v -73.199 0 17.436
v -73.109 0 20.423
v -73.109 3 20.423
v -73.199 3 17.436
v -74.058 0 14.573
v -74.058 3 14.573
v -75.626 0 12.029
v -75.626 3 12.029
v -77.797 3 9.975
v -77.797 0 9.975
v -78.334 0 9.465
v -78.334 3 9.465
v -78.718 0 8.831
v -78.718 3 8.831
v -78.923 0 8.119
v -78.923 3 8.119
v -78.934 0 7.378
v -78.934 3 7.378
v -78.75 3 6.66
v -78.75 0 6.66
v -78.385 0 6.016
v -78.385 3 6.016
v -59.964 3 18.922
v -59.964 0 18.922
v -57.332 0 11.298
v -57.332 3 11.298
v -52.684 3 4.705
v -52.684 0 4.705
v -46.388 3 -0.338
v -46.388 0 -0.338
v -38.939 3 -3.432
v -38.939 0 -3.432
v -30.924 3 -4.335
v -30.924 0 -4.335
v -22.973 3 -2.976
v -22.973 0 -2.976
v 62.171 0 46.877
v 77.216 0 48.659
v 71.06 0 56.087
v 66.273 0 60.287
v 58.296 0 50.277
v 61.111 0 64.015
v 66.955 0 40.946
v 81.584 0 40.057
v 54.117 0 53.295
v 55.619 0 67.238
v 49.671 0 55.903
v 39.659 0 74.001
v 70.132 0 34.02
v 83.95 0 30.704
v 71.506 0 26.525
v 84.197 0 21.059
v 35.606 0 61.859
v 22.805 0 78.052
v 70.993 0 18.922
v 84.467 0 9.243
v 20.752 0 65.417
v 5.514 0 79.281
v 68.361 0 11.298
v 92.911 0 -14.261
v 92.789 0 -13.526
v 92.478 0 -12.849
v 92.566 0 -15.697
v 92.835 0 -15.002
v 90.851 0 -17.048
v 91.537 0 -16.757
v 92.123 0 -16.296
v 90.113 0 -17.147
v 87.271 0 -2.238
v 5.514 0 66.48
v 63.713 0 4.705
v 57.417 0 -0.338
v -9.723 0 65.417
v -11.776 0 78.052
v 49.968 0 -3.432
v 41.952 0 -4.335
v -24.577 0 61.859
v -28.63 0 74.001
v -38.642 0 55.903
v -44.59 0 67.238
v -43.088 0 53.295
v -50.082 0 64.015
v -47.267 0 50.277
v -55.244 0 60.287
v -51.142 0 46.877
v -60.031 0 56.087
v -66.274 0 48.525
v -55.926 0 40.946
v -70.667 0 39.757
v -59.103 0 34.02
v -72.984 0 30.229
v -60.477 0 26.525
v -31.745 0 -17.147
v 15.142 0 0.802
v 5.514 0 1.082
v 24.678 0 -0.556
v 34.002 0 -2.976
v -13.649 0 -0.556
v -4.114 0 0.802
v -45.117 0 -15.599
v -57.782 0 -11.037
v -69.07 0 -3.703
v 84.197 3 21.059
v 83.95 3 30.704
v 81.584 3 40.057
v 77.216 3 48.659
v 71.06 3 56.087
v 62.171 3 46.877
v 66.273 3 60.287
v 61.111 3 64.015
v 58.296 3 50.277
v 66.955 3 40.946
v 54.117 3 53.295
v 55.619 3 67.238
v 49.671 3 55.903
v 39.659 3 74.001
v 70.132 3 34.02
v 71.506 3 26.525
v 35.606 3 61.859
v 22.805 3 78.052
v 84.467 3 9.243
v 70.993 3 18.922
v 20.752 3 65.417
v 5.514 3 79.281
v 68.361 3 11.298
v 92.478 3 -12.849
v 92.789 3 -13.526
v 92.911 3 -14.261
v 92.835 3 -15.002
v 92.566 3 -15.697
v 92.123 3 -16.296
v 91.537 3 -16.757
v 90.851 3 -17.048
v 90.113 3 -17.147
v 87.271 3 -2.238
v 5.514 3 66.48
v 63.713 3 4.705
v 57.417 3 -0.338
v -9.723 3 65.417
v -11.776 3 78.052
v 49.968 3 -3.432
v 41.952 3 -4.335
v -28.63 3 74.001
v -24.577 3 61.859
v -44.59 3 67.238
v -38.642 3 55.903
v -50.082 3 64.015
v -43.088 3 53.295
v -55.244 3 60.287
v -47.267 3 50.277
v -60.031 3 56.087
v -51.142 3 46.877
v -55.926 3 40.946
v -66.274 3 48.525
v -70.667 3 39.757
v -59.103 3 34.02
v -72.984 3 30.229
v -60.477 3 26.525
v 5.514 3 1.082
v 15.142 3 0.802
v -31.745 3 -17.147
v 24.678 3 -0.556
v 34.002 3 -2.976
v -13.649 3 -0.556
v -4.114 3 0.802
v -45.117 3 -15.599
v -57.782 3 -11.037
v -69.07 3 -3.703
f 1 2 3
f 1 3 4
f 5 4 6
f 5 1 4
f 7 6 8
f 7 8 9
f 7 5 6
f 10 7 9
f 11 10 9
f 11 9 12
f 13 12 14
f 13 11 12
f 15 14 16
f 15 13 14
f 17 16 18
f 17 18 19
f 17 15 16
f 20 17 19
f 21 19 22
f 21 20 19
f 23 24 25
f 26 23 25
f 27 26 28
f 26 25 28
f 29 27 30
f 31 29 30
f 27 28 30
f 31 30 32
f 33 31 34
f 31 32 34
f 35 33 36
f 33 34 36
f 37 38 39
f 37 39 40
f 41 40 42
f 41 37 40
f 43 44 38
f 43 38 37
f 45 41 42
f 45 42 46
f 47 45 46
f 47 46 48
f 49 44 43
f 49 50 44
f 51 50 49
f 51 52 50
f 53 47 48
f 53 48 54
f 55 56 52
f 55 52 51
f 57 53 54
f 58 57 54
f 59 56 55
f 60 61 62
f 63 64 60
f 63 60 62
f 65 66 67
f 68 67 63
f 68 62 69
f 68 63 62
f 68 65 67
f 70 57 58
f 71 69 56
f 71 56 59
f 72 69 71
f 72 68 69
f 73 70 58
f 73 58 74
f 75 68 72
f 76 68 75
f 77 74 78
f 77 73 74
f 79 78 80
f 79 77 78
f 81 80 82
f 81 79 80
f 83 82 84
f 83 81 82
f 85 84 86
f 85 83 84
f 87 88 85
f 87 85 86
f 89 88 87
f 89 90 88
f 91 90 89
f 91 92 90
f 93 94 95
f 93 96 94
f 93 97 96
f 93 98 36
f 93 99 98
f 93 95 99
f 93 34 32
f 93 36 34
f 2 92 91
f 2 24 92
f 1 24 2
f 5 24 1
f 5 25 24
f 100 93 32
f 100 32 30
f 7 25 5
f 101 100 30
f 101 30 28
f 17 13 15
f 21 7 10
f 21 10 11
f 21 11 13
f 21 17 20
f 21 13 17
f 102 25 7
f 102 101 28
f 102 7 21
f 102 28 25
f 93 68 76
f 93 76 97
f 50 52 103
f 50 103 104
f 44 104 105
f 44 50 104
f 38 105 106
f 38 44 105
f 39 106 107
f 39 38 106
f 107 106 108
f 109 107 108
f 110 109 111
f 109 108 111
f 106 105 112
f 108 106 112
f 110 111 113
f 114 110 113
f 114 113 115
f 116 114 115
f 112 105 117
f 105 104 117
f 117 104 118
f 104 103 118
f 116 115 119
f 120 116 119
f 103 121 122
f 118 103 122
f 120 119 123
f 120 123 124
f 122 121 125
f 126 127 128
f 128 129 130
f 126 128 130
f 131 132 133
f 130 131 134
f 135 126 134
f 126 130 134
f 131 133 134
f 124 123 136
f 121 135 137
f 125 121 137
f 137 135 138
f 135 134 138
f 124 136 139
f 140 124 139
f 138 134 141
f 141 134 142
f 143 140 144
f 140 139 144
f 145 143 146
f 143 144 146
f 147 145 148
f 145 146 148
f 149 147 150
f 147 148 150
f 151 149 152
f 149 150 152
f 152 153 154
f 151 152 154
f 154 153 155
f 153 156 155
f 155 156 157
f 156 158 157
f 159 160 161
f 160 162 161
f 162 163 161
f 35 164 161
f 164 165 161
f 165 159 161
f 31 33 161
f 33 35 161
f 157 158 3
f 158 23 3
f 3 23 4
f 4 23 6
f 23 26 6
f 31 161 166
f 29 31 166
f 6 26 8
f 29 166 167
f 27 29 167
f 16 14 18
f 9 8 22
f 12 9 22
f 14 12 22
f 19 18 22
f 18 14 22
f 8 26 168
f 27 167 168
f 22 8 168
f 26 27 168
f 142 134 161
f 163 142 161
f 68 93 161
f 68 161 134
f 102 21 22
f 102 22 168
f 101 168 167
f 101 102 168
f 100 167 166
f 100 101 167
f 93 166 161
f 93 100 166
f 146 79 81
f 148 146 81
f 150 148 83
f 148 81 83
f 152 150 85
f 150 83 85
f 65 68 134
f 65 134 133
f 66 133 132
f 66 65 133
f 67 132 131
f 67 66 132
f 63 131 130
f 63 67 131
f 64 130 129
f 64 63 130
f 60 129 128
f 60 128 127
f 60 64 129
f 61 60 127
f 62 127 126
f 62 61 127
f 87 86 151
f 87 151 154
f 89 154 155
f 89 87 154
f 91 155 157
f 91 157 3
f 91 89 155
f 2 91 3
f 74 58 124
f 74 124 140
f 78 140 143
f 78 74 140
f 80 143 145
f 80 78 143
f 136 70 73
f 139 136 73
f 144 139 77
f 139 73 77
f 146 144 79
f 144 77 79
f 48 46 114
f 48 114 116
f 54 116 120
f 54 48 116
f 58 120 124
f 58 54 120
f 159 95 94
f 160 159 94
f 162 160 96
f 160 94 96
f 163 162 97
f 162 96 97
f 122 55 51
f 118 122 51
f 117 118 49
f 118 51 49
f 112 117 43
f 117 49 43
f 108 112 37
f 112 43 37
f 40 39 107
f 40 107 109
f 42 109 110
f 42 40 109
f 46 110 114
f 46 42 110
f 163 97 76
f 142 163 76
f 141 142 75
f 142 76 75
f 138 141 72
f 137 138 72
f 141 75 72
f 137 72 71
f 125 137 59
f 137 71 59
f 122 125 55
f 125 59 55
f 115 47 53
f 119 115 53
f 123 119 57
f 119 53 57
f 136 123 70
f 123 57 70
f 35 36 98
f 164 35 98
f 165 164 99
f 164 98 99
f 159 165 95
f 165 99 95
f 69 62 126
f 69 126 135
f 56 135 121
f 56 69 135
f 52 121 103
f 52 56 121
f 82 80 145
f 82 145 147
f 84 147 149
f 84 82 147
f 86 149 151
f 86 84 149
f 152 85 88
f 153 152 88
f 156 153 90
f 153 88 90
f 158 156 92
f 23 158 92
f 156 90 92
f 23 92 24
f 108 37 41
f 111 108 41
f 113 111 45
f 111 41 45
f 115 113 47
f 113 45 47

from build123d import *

# Parameters (mm, degrees)
BOSS_EXTRUDE1_DEPTH = 3


with BuildPart() as part:
    # Sketch1 → Boss-Extrude1 (new body)
    with BuildSketch(Plane(origin=(0, 0, 0), x_dir=(1, 0, 0), z_dir=(0, 1, 0))):
        with BuildLine():
            Line((-31.744728966, 17.146847669), (90.112594835, 17.146847669))
            ThreePointArc((90.112594835, 17.146847669), (92.565620931, 15.696908028), (92.478118614, 12.848749793))
            ThreePointArc((92.478118614, 12.848749793), (85.55789243, -3.426446533), (84.197045341, -21.059360105))
            ThreePointArc((84.197045341, -21.059360105), (81.584356476, -40.056839396), (71.059546267, -56.086771791))
            ThreePointArc((71.059546267, -56.086771791), (63.736401413, -62.212035121), (55.619101507, -67.237643905))
            ThreePointArc((55.619101507, -67.237643905), (31.315398674, -76.373966348), (5.514443068, -79.281379121))
            ThreePointArc((5.514443068, -79.281379121), (-20.286512537, -76.373966348), (-44.59021537, -67.237643905))
            ThreePointArc((-44.59021537, -67.237643905), (-52.707515276, -62.212035121), (-60.03066013, -56.086771791))
            ThreePointArc((-60.03066013, -56.086771791), (-70.666595812, -39.757213537), (-73.108914698, -20.422977605))
            ThreePointArc((-73.108914698, -20.422977605), (-74.05774513, -14.573171652), (-77.796738294, -9.975298341))
            ThreePointArc((-77.796738294, -9.975298341), (-78.92336426, -8.119267018), (-78.384627262, -6.015959912))
            ThreePointArc((-78.384627262, -6.015959912), (-57.78218164, 11.037323217), (-31.744728966, 17.146847669))
        make_face()
        with BuildLine():
            ThreePointArc((5.514443068, -1.081998552), (19.929462064, -0.256796987), (34.001578397, 2.975736417))
            ThreePointArc((34.001578397, 2.975736417), (57.41708067, 0.337527336), (70.993213533, -18.922132846))
            ThreePointArc((70.993213533, -18.922132846), (70.131692962, -34.019755233), (62.170548913, -46.876683515))
            ThreePointArc((62.170548913, -46.876683515), (56.242369759, -51.835162299), (49.671311961, -55.903456704))
            ThreePointArc((49.671311961, -55.903456704), (28.252463685, -63.945588922), (5.514443068, -66.480420375))
            ThreePointArc((5.514443068, -66.480420375), (-17.223577548, -63.945588922), (-38.642425824, -55.903456704))
            ThreePointArc((-38.642425824, -55.903456704), (-45.213483622, -51.835162299), (-51.141662776, -46.876683515))
            ThreePointArc((-51.141662776, -46.876683515), (-59.102806825, -34.019755233), (-59.964327396, -18.922132846))
            ThreePointArc((-59.964327396, -18.922132846), (-46.388194533, 0.337527336), (-22.97269226, 2.975736417))
            ThreePointArc((-22.97269226, 2.975736417), (-8.900575928, -0.256796987), (5.514443068, -1.081998552))
        make_face(mode=Mode.SUBTRACT)
    extrude(amount=BOSS_EXTRUDE1_DEPTH)


solid = part.part
